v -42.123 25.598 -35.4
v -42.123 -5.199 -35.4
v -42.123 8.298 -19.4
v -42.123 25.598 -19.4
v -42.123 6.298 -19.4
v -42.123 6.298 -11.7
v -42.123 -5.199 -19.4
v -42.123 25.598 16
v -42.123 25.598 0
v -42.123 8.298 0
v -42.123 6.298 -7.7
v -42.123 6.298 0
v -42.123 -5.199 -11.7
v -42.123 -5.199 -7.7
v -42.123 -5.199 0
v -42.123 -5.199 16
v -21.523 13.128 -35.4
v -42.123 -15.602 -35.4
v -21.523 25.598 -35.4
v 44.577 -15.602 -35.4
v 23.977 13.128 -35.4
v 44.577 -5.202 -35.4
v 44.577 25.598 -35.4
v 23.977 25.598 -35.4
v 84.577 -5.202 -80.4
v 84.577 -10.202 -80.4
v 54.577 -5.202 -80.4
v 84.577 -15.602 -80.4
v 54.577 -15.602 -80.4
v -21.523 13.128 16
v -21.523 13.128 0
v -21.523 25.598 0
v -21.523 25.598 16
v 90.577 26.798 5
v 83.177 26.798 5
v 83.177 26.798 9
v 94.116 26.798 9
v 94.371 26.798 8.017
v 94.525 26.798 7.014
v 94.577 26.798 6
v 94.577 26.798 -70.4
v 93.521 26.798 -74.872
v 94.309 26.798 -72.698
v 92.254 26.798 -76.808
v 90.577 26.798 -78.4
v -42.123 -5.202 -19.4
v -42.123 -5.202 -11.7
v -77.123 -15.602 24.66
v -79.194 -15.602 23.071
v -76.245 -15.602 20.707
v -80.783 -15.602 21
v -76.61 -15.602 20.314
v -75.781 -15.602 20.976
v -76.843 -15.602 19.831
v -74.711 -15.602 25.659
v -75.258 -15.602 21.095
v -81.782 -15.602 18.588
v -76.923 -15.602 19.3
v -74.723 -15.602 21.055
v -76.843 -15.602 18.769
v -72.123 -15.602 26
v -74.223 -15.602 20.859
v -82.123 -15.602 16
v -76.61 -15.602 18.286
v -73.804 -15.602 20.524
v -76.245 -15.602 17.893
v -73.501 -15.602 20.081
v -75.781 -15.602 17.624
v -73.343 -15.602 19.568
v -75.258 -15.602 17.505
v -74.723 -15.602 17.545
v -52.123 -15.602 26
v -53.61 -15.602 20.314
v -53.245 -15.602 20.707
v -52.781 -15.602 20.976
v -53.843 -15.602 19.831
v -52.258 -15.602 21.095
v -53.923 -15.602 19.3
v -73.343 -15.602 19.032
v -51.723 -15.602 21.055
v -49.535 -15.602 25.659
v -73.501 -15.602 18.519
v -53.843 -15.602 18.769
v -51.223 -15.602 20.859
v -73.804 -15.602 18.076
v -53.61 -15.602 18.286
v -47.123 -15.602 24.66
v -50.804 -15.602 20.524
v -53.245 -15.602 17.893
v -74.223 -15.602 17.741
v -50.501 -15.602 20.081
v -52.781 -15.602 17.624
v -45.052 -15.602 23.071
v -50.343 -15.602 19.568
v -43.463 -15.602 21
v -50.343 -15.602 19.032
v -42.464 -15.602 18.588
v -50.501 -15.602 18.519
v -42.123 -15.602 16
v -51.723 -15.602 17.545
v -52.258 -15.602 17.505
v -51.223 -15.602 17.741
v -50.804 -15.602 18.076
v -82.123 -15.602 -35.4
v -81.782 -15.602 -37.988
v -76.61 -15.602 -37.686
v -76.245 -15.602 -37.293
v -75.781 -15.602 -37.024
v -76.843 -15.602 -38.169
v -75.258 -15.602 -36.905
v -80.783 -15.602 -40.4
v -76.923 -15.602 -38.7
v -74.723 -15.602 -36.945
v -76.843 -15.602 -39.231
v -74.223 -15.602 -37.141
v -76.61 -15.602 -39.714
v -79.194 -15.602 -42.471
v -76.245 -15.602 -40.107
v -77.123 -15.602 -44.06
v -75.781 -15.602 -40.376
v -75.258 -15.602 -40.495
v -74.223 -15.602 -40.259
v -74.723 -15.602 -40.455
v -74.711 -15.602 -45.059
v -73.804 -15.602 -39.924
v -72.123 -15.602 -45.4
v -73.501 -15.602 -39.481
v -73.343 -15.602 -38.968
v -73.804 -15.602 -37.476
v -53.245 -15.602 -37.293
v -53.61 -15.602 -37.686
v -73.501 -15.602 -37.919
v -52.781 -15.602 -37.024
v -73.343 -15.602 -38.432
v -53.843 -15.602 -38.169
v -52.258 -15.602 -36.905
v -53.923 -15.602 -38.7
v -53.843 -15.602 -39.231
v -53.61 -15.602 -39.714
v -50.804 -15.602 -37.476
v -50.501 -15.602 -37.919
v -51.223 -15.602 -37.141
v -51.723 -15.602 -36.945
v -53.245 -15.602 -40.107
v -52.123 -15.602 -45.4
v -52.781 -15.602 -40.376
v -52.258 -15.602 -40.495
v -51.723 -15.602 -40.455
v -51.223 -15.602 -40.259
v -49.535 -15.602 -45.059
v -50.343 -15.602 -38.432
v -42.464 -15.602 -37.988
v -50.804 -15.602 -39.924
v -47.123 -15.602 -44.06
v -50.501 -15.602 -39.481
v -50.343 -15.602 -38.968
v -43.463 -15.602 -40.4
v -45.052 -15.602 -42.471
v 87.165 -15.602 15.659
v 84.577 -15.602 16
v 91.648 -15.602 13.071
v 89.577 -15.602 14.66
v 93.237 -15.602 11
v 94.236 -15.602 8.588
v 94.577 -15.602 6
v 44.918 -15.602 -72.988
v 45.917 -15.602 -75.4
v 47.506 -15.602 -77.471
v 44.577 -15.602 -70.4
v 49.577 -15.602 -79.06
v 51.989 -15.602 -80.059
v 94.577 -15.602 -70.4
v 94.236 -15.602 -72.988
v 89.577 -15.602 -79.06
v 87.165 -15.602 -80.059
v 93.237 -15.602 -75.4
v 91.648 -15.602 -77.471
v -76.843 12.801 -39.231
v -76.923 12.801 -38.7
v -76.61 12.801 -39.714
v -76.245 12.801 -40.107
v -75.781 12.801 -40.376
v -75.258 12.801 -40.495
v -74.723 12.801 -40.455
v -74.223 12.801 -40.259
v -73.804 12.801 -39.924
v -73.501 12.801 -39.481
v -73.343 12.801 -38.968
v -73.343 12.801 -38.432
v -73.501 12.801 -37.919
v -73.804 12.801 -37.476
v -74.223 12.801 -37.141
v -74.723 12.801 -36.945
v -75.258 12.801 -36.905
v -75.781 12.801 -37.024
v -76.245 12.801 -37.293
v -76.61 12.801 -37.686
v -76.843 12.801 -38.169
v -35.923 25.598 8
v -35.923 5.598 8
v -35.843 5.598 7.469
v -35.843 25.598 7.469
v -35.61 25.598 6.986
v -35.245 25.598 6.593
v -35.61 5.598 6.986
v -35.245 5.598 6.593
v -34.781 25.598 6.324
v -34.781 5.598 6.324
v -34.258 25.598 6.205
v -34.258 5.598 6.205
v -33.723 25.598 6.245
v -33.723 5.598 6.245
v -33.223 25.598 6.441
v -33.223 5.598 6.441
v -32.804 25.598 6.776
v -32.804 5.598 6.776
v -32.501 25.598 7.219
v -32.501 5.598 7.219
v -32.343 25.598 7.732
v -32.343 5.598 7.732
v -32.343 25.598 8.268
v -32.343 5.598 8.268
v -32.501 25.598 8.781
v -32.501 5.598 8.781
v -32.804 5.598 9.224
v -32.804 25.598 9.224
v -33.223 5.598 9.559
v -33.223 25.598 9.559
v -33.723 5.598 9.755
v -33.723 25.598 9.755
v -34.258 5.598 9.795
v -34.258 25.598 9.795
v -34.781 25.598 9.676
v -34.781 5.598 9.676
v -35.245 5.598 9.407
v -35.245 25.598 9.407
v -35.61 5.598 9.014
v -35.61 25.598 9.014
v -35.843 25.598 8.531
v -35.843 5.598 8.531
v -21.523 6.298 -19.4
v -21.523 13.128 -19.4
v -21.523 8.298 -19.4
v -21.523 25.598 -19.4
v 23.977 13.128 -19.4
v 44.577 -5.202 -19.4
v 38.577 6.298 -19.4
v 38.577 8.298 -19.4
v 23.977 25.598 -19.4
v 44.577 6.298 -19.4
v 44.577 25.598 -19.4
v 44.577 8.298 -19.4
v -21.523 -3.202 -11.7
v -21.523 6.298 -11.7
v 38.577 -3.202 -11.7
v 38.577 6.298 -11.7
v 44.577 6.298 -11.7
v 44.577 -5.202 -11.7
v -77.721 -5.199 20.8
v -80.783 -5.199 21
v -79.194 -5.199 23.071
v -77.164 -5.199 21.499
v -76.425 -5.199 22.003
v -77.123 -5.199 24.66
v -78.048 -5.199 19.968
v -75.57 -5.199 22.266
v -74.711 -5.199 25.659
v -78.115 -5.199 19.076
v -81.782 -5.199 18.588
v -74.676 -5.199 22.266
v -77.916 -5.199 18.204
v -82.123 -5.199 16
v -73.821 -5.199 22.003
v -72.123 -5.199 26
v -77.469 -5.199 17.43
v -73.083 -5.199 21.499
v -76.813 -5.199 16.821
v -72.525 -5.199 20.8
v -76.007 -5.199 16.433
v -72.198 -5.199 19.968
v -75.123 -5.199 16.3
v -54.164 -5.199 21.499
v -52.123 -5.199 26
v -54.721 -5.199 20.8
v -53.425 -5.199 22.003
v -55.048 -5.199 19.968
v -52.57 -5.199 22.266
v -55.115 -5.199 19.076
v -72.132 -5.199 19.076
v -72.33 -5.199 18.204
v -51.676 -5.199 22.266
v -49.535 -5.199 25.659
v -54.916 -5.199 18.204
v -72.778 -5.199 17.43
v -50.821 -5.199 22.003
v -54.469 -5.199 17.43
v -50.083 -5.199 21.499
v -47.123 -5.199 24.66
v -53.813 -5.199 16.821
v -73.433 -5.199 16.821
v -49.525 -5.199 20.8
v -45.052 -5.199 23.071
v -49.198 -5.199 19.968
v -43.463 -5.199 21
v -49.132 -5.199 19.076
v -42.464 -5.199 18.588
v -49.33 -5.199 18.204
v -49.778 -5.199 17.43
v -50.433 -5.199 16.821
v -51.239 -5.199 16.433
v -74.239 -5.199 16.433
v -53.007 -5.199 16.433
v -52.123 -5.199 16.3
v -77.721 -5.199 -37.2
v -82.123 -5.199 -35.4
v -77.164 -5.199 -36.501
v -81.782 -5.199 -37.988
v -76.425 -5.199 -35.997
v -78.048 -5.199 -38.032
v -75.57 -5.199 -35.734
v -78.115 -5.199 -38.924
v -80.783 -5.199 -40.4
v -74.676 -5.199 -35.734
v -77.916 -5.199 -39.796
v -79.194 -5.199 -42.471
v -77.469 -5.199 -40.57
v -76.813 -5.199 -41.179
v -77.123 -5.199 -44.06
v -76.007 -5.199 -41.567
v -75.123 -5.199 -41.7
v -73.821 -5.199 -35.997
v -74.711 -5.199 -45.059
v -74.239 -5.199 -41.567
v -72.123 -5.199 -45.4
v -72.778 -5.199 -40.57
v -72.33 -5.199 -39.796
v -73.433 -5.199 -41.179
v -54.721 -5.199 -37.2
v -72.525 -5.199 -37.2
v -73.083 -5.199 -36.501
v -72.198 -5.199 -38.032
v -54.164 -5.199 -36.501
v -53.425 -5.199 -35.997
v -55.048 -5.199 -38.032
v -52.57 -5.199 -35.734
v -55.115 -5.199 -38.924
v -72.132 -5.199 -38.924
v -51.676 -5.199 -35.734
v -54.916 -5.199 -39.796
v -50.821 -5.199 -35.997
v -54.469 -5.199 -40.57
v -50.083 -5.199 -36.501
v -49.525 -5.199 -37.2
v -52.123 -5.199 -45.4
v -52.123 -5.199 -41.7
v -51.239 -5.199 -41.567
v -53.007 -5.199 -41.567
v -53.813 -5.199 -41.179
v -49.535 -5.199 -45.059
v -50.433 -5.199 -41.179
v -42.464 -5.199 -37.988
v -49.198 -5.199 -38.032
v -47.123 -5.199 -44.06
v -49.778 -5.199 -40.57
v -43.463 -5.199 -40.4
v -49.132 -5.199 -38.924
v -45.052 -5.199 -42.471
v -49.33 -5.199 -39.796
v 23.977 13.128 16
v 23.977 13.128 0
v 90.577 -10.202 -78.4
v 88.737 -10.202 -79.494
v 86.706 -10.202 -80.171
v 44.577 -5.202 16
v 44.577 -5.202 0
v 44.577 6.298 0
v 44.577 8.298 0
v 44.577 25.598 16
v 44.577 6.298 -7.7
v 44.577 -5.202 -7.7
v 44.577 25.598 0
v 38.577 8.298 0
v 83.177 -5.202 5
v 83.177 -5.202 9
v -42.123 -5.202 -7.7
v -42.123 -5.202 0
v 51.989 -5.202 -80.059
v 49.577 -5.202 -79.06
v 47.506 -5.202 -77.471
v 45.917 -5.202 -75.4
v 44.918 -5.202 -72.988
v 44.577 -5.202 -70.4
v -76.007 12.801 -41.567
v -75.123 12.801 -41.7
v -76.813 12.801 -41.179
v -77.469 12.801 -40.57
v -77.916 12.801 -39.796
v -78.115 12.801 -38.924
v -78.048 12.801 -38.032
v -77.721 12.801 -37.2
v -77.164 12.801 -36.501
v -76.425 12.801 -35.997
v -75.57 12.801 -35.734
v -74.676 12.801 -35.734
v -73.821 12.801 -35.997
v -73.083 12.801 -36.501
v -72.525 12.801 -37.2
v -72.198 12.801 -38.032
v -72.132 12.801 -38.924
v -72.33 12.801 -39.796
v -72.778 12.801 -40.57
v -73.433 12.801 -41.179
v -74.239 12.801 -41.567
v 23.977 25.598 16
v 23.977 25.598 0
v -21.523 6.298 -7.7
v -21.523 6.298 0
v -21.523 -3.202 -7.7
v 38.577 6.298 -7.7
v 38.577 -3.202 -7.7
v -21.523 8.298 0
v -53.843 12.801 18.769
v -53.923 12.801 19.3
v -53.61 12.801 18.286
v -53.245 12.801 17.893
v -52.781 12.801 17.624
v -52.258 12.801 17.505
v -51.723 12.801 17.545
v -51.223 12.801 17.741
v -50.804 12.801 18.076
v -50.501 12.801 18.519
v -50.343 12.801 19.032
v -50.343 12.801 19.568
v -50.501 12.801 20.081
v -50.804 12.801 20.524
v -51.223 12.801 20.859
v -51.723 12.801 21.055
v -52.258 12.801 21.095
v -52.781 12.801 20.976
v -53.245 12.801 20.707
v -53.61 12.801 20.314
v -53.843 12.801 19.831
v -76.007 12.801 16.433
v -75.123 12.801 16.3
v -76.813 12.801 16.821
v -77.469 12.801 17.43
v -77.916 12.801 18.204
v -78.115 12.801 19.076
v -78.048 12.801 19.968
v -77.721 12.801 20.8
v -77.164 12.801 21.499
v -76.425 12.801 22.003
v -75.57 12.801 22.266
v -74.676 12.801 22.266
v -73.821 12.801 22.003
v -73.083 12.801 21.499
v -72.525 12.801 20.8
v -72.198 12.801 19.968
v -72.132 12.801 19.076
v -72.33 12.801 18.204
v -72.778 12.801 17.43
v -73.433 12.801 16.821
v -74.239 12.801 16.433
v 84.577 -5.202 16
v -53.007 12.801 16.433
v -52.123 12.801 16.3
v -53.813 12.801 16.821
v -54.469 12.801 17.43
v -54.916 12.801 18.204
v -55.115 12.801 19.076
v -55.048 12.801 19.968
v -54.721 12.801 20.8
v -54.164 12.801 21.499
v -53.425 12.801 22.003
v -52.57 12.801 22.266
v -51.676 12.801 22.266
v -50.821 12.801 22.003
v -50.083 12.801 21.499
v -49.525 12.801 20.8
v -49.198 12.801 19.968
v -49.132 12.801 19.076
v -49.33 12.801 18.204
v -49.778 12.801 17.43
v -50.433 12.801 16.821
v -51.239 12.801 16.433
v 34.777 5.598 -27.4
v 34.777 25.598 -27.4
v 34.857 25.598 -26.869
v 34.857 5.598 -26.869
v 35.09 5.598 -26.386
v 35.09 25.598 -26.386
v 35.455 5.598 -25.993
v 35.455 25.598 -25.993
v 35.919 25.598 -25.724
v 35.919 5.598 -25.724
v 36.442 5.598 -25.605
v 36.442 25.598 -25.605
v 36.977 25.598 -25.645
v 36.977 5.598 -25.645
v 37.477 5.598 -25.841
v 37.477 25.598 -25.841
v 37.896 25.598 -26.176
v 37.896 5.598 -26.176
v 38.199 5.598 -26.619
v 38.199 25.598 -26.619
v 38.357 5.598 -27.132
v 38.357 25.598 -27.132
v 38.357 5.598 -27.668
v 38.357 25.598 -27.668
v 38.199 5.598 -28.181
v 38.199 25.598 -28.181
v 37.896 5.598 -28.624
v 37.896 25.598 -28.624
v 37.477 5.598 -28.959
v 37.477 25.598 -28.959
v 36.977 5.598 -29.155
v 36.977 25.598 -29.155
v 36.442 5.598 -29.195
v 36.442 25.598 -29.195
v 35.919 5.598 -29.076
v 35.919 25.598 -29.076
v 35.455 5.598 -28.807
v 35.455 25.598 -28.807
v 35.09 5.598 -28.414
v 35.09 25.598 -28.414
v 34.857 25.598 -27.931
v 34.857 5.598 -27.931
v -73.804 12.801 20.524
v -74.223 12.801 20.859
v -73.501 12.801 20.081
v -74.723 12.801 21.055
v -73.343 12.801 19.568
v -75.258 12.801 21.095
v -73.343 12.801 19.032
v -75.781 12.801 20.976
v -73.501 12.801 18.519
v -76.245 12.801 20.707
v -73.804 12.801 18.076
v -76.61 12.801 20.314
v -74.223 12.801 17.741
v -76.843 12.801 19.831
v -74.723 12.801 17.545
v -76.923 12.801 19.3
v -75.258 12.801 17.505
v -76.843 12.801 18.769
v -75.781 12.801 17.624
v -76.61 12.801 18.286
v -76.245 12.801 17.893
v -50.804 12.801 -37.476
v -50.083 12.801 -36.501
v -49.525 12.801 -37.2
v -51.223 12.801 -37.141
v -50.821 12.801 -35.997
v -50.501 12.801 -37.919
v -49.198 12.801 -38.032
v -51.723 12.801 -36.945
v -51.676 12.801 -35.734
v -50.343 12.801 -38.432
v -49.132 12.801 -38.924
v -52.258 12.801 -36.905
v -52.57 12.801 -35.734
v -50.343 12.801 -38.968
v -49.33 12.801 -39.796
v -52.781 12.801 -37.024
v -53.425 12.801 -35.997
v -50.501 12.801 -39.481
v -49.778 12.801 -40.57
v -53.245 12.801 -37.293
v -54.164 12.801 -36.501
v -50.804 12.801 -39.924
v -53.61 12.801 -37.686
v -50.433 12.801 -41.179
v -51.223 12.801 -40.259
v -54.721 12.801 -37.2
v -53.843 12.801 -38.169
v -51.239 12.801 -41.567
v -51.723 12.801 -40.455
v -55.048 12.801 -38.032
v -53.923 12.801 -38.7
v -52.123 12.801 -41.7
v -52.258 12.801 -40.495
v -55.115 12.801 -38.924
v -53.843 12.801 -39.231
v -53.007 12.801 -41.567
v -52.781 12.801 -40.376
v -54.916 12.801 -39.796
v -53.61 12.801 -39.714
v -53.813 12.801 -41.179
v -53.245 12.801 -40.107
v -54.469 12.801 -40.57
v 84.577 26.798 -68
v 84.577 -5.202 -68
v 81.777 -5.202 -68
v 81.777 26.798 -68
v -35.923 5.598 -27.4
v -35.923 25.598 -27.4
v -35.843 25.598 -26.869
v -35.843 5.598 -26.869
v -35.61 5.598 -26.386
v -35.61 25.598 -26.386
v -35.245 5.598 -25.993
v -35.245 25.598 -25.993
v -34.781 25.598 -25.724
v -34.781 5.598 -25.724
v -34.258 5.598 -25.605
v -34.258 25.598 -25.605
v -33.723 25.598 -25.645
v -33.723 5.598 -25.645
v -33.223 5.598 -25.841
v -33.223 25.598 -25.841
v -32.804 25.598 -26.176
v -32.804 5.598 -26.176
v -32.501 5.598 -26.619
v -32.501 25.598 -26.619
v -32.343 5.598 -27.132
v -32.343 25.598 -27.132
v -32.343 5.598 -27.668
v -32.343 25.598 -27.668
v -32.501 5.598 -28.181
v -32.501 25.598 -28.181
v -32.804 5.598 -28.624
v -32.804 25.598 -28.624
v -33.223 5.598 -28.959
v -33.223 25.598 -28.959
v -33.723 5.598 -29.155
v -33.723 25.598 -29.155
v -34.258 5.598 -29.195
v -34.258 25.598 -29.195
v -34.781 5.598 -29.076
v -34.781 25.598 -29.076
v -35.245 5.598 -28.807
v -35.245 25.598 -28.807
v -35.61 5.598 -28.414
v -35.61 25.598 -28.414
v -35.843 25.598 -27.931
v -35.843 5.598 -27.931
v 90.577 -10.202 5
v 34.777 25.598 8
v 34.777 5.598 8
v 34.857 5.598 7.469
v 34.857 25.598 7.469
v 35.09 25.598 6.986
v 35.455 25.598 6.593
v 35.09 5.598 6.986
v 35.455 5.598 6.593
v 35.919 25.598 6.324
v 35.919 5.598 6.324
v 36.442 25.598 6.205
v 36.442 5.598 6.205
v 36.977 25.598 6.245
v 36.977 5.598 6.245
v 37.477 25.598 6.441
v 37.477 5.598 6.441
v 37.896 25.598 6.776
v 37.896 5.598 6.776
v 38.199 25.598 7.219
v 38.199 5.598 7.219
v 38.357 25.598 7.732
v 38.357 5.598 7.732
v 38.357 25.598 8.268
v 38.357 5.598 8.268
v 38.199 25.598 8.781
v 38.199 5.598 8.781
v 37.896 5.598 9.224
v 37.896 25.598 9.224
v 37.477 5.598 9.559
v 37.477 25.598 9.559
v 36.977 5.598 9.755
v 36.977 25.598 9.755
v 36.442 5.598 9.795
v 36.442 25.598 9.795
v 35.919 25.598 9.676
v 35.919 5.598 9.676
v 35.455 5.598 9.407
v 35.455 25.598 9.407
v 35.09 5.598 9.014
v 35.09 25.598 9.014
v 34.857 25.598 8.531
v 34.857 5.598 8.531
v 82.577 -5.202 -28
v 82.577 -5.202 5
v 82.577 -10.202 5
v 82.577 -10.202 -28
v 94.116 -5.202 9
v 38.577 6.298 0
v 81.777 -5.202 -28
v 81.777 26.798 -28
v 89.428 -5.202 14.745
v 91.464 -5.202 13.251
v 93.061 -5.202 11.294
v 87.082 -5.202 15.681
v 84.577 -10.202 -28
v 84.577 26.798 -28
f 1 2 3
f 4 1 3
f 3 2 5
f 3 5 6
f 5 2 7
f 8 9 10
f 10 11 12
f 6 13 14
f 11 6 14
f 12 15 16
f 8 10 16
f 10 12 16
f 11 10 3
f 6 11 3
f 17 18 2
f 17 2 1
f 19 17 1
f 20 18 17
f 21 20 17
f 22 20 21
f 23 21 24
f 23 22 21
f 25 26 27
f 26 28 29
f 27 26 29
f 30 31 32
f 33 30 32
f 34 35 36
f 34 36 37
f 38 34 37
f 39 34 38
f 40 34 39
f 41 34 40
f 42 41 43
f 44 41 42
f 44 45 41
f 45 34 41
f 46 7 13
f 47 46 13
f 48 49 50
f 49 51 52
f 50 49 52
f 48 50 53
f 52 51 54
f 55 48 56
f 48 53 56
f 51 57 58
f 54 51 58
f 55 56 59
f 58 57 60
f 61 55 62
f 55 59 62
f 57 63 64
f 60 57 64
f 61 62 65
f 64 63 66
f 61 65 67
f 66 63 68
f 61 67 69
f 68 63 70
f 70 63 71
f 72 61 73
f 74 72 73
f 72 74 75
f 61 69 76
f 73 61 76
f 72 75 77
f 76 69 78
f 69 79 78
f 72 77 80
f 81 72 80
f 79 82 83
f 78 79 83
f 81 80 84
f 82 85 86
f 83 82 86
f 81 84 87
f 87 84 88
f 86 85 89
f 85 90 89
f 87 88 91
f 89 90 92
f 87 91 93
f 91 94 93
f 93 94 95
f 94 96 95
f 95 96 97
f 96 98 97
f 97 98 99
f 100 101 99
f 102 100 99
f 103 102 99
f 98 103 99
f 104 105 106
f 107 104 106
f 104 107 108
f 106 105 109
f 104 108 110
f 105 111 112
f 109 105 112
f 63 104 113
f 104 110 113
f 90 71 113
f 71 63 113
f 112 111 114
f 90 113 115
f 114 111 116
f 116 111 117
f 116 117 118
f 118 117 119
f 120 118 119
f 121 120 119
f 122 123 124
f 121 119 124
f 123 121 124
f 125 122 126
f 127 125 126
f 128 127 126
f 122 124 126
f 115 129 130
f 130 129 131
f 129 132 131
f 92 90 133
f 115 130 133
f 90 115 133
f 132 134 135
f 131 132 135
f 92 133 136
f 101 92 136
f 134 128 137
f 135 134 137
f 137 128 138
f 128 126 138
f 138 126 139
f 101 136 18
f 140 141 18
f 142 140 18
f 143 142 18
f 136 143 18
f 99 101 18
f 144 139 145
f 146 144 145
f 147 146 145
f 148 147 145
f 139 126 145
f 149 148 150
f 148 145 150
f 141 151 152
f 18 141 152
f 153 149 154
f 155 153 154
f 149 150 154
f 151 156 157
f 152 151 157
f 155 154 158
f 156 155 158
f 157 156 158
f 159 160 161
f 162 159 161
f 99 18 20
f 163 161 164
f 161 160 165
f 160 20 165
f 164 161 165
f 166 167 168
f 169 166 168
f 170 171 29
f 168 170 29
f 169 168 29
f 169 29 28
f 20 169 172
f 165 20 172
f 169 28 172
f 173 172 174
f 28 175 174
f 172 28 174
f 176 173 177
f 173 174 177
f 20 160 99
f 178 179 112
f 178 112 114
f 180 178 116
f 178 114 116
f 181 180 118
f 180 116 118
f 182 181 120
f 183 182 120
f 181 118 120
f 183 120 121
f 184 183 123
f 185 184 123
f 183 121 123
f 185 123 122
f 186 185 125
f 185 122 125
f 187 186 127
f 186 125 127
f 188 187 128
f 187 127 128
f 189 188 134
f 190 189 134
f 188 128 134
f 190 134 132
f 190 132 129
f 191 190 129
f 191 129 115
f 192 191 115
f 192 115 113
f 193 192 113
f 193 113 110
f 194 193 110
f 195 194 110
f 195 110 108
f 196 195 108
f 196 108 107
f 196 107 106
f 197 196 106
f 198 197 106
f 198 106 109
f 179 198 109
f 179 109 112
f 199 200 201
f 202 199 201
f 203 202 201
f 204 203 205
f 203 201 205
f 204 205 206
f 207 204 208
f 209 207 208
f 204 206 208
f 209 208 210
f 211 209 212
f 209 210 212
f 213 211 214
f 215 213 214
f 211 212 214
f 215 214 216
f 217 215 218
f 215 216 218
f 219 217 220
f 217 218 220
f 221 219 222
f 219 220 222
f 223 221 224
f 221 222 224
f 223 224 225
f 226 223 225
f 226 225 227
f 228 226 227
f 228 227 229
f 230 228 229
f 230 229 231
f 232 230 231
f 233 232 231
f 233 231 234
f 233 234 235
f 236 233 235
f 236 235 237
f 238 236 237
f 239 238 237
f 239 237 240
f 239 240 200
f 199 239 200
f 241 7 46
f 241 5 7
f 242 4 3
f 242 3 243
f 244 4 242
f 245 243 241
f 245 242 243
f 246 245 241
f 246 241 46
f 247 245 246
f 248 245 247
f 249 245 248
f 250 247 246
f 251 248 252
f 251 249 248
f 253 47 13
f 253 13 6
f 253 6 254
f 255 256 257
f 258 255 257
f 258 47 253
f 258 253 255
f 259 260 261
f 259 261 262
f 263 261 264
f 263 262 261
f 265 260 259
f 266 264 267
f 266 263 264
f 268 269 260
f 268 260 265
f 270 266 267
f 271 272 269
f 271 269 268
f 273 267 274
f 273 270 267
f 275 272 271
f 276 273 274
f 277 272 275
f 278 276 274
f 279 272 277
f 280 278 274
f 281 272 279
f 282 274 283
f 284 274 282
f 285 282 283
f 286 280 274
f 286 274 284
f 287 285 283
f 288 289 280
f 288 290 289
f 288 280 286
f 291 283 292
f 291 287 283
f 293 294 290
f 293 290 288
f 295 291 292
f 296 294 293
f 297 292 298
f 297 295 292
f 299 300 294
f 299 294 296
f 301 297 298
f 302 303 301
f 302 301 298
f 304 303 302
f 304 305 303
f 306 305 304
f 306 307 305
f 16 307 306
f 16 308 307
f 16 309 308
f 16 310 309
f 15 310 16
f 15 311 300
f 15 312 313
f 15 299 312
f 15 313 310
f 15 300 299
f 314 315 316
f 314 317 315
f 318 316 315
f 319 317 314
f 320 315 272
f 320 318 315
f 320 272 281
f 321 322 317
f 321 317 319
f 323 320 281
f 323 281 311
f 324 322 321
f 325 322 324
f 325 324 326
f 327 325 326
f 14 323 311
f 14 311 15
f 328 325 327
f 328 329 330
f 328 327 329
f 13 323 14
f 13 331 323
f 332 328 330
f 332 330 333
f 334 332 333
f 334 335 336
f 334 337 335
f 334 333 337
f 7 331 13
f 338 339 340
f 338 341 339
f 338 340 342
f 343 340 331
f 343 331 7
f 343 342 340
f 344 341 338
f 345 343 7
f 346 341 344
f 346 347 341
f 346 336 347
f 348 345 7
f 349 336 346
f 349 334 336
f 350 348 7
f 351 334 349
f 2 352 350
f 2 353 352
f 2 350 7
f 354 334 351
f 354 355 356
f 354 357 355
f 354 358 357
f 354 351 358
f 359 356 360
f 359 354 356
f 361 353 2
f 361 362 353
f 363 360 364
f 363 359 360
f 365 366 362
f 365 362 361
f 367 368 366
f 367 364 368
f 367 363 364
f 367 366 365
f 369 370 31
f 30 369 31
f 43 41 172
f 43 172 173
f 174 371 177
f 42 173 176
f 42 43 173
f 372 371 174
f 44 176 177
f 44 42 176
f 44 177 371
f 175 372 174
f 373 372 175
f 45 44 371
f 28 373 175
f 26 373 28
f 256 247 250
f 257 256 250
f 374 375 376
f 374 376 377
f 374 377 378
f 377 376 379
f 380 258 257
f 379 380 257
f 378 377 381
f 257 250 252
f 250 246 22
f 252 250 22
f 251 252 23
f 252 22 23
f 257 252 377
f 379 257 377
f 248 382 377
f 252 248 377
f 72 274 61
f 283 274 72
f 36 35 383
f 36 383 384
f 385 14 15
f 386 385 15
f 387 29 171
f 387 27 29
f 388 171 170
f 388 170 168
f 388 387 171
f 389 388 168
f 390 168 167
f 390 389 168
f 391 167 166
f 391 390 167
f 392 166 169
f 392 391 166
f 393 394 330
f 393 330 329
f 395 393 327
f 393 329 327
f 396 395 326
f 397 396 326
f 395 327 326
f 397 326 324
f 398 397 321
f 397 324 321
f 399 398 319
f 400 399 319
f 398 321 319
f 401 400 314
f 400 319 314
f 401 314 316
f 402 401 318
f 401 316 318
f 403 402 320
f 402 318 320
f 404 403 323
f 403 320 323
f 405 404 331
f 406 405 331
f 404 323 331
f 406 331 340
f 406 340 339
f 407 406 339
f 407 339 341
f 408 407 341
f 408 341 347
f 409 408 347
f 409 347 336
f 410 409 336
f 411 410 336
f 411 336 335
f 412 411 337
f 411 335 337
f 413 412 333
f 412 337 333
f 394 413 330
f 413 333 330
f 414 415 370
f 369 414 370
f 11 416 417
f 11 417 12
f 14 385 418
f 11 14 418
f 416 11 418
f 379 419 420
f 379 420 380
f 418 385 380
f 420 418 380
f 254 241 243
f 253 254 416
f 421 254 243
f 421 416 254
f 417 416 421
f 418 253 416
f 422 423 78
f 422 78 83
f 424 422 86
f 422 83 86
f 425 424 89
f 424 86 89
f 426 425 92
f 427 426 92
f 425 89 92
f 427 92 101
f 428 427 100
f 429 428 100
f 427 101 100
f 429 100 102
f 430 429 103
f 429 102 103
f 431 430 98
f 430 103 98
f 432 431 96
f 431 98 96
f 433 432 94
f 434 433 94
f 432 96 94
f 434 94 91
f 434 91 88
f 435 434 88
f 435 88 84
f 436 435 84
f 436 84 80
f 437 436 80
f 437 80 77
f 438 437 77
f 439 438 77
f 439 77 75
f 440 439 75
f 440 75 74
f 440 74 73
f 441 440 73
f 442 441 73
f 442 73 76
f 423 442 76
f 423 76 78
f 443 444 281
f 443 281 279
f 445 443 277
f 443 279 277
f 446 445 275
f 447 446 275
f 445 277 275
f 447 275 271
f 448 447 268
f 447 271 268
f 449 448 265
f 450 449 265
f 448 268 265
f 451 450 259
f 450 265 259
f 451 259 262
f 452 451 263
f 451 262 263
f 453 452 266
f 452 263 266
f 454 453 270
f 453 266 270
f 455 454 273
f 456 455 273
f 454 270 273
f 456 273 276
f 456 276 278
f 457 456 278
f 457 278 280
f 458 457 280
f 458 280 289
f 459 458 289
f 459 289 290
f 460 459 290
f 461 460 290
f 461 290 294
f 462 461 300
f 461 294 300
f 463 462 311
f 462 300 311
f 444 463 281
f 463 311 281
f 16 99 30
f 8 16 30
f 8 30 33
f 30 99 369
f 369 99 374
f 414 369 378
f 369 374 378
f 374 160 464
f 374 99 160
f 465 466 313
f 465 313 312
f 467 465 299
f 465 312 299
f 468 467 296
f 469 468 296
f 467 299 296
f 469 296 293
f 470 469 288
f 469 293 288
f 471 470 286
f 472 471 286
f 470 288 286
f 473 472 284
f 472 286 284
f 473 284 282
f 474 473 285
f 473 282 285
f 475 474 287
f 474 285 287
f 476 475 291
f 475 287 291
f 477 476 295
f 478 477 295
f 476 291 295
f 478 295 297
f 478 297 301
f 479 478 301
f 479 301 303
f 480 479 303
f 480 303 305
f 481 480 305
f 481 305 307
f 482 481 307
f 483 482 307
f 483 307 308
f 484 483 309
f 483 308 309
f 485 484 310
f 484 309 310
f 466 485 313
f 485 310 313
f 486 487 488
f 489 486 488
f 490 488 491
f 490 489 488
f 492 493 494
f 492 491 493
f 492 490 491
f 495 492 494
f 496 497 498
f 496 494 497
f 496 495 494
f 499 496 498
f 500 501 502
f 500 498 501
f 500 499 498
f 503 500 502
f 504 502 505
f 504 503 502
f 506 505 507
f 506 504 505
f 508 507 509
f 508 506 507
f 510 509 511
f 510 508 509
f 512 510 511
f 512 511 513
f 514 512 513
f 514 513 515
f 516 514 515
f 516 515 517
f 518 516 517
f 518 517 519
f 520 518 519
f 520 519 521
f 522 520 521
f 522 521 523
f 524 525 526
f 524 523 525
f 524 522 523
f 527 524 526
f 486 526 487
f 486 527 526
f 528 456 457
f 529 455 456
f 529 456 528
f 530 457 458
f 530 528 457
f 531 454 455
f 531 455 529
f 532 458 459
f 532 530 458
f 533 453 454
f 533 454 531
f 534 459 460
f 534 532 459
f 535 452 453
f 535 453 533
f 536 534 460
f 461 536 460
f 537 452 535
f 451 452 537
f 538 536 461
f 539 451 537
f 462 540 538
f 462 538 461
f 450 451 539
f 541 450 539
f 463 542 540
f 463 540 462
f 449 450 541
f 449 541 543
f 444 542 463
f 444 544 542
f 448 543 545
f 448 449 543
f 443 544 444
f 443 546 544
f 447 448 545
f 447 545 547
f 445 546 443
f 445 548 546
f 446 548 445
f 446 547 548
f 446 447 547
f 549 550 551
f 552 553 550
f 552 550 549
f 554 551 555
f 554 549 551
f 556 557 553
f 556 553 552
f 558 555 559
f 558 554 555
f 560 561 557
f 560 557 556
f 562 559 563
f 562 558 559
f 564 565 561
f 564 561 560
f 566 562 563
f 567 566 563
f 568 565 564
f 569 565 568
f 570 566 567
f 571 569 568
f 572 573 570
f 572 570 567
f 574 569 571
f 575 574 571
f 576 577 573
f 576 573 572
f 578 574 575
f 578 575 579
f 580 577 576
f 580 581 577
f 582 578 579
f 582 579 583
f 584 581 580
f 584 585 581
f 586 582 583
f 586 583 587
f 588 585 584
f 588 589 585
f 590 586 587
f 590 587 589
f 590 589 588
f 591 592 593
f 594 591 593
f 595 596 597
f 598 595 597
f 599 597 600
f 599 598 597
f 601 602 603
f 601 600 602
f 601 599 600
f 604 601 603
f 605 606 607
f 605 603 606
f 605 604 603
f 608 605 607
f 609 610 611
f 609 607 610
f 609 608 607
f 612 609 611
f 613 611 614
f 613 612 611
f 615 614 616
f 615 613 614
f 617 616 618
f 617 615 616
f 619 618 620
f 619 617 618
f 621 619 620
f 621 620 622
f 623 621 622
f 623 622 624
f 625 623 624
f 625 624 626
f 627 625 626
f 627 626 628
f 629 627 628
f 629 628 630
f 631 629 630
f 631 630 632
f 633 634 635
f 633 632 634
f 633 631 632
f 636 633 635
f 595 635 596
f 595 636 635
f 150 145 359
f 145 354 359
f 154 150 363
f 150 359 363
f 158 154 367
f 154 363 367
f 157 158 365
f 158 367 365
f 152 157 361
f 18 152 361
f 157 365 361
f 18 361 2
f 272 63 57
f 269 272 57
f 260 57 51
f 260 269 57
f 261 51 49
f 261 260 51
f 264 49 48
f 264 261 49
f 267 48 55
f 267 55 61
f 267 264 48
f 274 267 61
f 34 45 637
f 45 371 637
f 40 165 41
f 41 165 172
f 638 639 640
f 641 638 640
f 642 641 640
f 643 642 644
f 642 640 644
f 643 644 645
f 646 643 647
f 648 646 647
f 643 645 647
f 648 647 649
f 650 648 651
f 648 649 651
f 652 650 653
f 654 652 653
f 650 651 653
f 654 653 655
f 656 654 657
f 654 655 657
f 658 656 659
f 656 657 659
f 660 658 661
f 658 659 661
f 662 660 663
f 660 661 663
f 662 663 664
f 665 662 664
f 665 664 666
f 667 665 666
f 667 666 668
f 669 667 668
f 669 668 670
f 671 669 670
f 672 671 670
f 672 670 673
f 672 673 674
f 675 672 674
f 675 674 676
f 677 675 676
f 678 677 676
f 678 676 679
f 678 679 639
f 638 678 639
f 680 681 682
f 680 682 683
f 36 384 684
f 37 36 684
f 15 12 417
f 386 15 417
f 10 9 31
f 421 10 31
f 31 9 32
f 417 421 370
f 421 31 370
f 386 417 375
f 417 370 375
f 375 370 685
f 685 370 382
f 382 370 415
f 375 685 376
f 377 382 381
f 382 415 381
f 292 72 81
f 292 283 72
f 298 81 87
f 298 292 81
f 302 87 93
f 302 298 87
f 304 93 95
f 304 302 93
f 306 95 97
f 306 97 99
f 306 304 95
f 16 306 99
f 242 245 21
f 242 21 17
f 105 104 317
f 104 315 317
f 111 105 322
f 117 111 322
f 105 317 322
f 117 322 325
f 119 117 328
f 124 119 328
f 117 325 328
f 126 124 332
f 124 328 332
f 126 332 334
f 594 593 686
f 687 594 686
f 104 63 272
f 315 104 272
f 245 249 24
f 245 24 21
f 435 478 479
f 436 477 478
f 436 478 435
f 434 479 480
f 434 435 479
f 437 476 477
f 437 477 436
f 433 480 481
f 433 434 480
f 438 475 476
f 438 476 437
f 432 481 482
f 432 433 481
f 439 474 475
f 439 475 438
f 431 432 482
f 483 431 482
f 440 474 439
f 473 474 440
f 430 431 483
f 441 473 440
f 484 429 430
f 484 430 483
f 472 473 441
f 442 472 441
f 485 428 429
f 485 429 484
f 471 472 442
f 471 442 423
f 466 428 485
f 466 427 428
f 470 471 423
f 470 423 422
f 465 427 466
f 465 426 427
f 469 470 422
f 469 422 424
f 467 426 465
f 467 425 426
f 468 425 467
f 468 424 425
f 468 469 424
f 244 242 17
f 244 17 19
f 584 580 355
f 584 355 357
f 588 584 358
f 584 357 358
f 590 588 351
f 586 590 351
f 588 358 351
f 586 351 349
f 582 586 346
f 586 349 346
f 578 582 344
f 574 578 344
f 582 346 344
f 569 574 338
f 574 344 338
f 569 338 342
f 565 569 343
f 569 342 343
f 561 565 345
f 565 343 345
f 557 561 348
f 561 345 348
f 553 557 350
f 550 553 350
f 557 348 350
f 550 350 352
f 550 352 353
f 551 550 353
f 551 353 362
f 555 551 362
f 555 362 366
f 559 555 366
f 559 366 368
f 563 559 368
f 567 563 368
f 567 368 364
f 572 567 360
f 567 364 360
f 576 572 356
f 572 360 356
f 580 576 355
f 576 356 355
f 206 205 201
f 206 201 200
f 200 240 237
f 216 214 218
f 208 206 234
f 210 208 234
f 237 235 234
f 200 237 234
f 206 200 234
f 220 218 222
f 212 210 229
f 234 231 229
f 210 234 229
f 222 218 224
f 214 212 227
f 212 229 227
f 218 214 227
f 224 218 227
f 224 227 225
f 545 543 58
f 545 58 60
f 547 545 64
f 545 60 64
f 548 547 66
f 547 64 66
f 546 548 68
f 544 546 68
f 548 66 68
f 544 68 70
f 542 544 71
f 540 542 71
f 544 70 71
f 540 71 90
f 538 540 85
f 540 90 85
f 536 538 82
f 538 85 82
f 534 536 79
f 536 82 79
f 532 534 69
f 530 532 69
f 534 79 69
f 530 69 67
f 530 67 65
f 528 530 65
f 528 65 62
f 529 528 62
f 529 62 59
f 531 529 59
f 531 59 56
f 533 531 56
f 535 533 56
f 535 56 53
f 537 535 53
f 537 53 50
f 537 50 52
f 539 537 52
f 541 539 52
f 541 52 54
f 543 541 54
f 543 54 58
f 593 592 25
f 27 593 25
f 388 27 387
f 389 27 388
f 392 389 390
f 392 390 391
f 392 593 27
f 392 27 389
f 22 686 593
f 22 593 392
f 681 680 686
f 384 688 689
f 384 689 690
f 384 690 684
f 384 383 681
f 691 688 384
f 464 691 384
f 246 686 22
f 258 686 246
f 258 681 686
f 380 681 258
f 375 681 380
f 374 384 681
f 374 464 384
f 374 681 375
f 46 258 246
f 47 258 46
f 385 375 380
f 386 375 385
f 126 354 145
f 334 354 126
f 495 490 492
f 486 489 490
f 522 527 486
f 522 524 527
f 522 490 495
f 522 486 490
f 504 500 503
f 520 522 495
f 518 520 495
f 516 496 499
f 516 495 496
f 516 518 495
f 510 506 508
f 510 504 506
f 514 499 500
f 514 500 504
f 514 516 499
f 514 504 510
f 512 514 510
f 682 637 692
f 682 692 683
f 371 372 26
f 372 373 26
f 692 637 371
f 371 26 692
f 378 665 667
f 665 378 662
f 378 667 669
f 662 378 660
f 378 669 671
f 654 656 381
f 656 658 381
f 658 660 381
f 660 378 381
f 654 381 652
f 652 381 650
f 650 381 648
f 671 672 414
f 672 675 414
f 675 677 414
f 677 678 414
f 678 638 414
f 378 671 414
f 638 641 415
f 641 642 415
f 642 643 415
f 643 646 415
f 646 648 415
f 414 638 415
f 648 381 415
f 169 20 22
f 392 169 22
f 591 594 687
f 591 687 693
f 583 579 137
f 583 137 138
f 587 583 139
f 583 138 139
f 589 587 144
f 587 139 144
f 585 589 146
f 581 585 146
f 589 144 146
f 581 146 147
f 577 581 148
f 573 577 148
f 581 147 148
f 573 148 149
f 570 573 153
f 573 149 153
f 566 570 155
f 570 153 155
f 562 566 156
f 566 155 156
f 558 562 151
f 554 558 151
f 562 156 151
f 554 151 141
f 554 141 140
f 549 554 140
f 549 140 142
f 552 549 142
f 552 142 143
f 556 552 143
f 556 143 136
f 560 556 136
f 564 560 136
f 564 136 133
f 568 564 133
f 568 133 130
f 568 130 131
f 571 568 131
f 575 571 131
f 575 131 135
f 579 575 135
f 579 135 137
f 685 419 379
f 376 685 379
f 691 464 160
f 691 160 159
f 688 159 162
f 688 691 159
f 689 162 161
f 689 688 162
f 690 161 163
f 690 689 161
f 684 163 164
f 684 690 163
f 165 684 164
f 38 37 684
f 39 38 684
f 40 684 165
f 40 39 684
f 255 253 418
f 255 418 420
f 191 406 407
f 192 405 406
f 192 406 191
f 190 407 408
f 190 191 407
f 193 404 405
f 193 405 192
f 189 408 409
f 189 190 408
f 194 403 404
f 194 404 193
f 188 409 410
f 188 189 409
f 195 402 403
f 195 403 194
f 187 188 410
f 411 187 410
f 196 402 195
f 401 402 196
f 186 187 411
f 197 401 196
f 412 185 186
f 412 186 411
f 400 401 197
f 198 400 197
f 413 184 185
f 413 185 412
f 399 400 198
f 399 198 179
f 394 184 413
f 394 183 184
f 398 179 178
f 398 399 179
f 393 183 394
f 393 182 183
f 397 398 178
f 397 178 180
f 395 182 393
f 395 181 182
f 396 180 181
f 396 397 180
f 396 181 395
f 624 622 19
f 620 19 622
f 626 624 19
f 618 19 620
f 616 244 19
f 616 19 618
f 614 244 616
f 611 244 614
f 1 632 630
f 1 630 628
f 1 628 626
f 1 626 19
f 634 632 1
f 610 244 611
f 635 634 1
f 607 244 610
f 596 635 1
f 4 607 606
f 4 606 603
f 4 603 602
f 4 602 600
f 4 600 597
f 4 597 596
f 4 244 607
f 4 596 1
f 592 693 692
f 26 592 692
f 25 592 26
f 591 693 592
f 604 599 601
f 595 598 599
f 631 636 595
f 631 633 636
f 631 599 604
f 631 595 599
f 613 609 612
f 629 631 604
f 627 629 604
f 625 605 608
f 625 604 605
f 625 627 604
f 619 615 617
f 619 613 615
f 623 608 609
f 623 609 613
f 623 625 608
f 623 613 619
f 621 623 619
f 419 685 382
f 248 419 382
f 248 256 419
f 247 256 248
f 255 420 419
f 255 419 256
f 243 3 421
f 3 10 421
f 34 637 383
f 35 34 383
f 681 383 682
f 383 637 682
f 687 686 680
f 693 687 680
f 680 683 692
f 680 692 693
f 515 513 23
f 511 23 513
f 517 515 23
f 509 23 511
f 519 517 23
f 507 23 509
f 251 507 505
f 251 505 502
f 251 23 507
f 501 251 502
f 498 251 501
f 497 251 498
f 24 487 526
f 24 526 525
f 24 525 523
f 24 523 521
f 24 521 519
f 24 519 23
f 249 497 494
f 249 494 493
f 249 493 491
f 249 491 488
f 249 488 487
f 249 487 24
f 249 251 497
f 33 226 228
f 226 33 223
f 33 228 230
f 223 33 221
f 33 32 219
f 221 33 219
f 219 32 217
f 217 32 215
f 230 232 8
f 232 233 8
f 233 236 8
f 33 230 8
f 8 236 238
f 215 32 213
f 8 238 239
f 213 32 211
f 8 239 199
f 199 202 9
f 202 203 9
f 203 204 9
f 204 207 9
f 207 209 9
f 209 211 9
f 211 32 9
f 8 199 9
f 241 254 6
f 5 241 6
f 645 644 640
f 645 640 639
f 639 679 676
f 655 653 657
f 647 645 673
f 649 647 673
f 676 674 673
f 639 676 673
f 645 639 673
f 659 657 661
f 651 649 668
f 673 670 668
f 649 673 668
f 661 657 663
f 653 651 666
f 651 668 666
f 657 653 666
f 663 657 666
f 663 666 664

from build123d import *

# Parameters (mm, degrees)
EXTRUDE_1_DEPTH     = 16
F_1_0MM_1_D         = 3.6
F_1_0MM_2_D         = 3.6
SKETCH_8_W          = 86.7
SKETCH_8_H          = 16
EXTRUDE_2_DEPTH     = 21.2
SKETCH_9_W          = 86.7
SKETCH_9_H          = 10.4
EXTRUDE_3_DEPTH     = 9.7
SKETCH_15_W         = 20.6
SKETCH_15_H         = 2
EXTRUDE_8_DEPTH     = 13.5
SKETCH_16_W         = 20.6
SKETCH_16_H         = 2
EXTRUDE_9_DEPTH     = 10.5
SKETCH_19_W         = 51.4
SKETCH_19_H         = 10.4
EXTRUDE_10_DEPTH    = 50
SKETCH_25_W         = 50
SKETCH_25_H         = 10.4
EXTRUDE_11_DEPTH    = 45
EXTRUDE_12_DEPTH    = 32
CUT_EXTRUDE_1_DEPTH = 5
SKETCH_29_W         = 51.4
SKETCH_29_H         = 10.402970243
EXTRUDE_13_DEPTH    = 40
SKETCH_32_W         = 40
SKETCH_32_H         = 10.402970243
EXTRUDE_14_DEPTH    = 10
SKETCH_33_W         = 40
SKETCH_33_H         = 10.402970243
EXTRUDE_15_DEPTH    = 10
SKETCH_34_R         = 3
EXTRUDE_16_DEPTH    = 18
F_1_0MM_3_D         = 3.6
F_1_0MM_4_D         = 3.6
FILLET_1_R          = 10
FILLET_2_R          = 10
SKETCH_40_W         = 6
SKETCH_40_H         = 4
EXTRUDE_17_DEPTH    = 11.5
SKETCH_42_W         = 6
SKETCH_42_H         = 19.4
EXTRUDE_18_DEPTH    = 2
SKETCH_46_W         = 60.1
SKETCH_46_H         = 4
EXTRUDE_19_DEPTH    = 2


with BuildPart() as part:
    # 草图1 → 凸台-拉伸1 (new body)
    with BuildSketch(Plane.XY):
        Polygon((-21.523113208, 25.59839861), (-42.123113208, 25.59839861), (-42.123113208, 5.59839861), (44.576886792, 5.59839861), (44.576886792, 25.59839861), (23.976886792, 25.59839861), (23.976886792, 13.12839861), (-21.523113208, 13.12839861), align=None)
    extrude_1 = extrude(amount=EXTRUDE_1_DEPTH)

    # Ø1.0mm 暗销孔1 (through all)
    with Locations(Plane(origin=(0, 25.59839861, 0), x_dir=(1, 0, 0), z_dir=(0, 1, 0))):
        with Locations((36.576886792, -8)):
            f_1_0mm_1 = Hole(F_1_0MM_1_D / 2)

    # Ø1.0mm 暗销孔2 (through all)
    with Locations(Plane(origin=(0, 25.59839861, 0), x_dir=(1, 0, 0), z_dir=(0, 1, 0))):
        with Locations((-34.123113208, -8)):
            f_1_0mm_2 = Hole(F_1_0MM_2_D / 2)

    # 草图8 → 凸台-拉伸2 (add)
    with BuildSketch(Plane.XZ.offset(-5.59839861)):
        with Locations((1.226886792, 8)):
            Rectangle(SKETCH_8_W, SKETCH_8_H)
    extrude_2 = extrude(amount=EXTRUDE_2_DEPTH)

    # 草图9 → 凸台-拉伸3 (add)
    with BuildSketch(Plane(origin=(0, 0, 0), x_dir=(-1, 0, 0), z_dir=(0, 0, -1))):
        with Locations((-1.226886792, -10.40160139)):
            Rectangle(SKETCH_9_W, SKETCH_9_H)
    extrude_3 = extrude(amount=EXTRUDE_3_DEPTH)

    # 草图15 → 凸台-拉伸8 (add)
    with BuildSketch(Plane(origin=(0, -5.20160139, 0), x_dir=(1, 0, 0), z_dir=(0, 1, 0))):
        with Locations((-31.823113208, 8.7)):
            Rectangle(SKETCH_15_W, SKETCH_15_H)
    extrude_8 = extrude(amount=EXTRUDE_8_DEPTH)

    # 草图16 → 凸台-拉伸9 (add)
    with BuildSketch(Plane(origin=(0, 0, -9.7), x_dir=(-1, 0, 0), z_dir=(0, 0, -1))):
        with Locations((31.823113208, 7.29839861)):
            Rectangle(SKETCH_16_W, SKETCH_16_H)
    extrude_9 = extrude(amount=-EXTRUDE_9_DEPTH)

    # 镜向20: 凸台-拉伸1, Ø1.0mm 暗销孔1, Ø1.0mm 暗销孔2, 凸台-拉伸2, 凸台-拉伸3, 凸台-拉伸8, 凸台-拉伸9 across plane
    add(extrude_1.mirror(Plane.XY.offset(-9.7)))
    add(f_1_0mm_1.mirror(Plane.XY.offset(-9.7)), mode=Mode.SUBTRACT)
    add(f_1_0mm_2.mirror(Plane.XY.offset(-9.7)), mode=Mode.SUBTRACT)
    add(extrude_2.mirror(Plane.XY.offset(-9.7)))
    add(extrude_3.mirror(Plane.XY.offset(-9.7)))
    add(extrude_8.mirror(Plane.XY.offset(-9.7)))
    add(extrude_9.mirror(Plane.XY.offset(-9.7)))

    # 草图19 → 凸台-拉伸10 (add)
    with BuildSketch(Plane(origin=(44.576886792, 0, 0), x_dir=(0, 0, -1), z_dir=(1, 0, 0))):
        with Locations((9.7, -10.40160139)):
            Rectangle(SKETCH_19_W, SKETCH_19_H)
    extrude(amount=EXTRUDE_10_DEPTH)

    # 草图25 → 凸台-拉伸11 (add)
    with BuildSketch(Plane(origin=(0, 0, -35.4), x_dir=(-1, 0, 0), z_dir=(0, 0, -1))):
        with Locations((-69.576886792, -10.40160139)):
            Rectangle(SKETCH_25_W, SKETCH_25_H)
    extrude(amount=EXTRUDE_11_DEPTH)

    # 草图26 → 凸台-拉伸12 (add)
    with BuildSketch(Plane(origin=(0, -5.20160139, 0), x_dir=(1, 0, 0), z_dir=(0, 1, 0))):
        Polygon((83.176886792, -9), (94.576886792, -9), (94.576886792, -5), (94.576886792, 80.4), (90.576886792, 80.4), (90.576886792, -5), (83.176886792, -5), align=None)
        Polygon((83.176886792, 28), (84.576886792, 28), (84.576886792, 68), (83.176886792, 68), (81.776886792, 68), (81.776886792, 28), align=None)
    extrude(amount=EXTRUDE_12_DEPTH)

    # 草图28 → 切除-拉伸1 (cut)
    with BuildSketch(Plane(origin=(0, -5.20160139, 0), x_dir=(1, 0, 0), z_dir=(0, 1, 0))):
        Polygon((90.576886792, -5), (84.576886792, -5), (82.576886792, -5), (82.576886792, 28), (84.576886792, 28), (84.576886792, 80.4), (90.576886792, 80.4), align=None)
    extrude(amount=-CUT_EXTRUDE_1_DEPTH, mode=Mode.SUBTRACT)

    # 草图29 → 凸台-拉伸13 (add)
    with BuildSketch(Plane.ZY.offset(42.123113208)):
        with Locations((-9.7, -10.400116268)):
            Rectangle(SKETCH_29_W, SKETCH_29_H)
    extrude(amount=EXTRUDE_13_DEPTH)

    # 草图32 → 凸台-拉伸14 (add)
    with BuildSketch(Plane(origin=(0, 0, -35.4), x_dir=(-1, 0, 0), z_dir=(0, 0, -1))):
        with Locations((62.123113208, -10.400116268)):
            Rectangle(SKETCH_32_W, SKETCH_32_H)
    extrude(amount=EXTRUDE_14_DEPTH)

    # 草图33 → 凸台-拉伸15 (add)
    with BuildSketch(Plane.XY.offset(16)):
        with Locations((-62.123113208, -10.400116268)):
            Rectangle(SKETCH_33_W, SKETCH_33_H)
    extrude(amount=EXTRUDE_15_DEPTH)

    # 草图34 → 凸台-拉伸16 (add)
    with BuildSketch(Plane(origin=(0, -5.198631147, 0), x_dir=(1, 0, 0), z_dir=(0, 1, 0))):
        with Locations(Location((-52.123113208, 38.7, 0), (0, 0, 90))):
            Circle(SKETCH_34_R)
        with Locations(Location((-75.123113208, 38.7, 0), (0, 0, 90))):
            Circle(SKETCH_34_R)
        with Locations(Location((-52.123113208, -19.3, 0), (0, 0, 90))):
            Circle(SKETCH_34_R)
        with Locations(Location((-75.123113208, -19.3, 0), (0, 0, 90))):
            Circle(SKETCH_34_R)
    extrude(amount=EXTRUDE_16_DEPTH)

    # Ø1.0mm 暗销孔3 (through all)
    with Locations(Plane(origin=(0, 12.801368853, 0), x_dir=(1, 0, 0), z_dir=(0, 1, 0))):
        with Locations((-52.123113208, 38.7)):
            Hole(F_1_0MM_3_D / 2)

    # Ø1.0mm 暗销孔4 (through all)
    with Locations(Plane(origin=(0, 12.801368853, 0), x_dir=(1, 0, 0), z_dir=(0, 1, 0))):
        with Locations((-52.123113208, -19.3), (-75.123113208, 38.7), (-75.123113208, -19.3)):
            Hole(F_1_0MM_4_D / 2)

    # 圆角1
    fillet_1_edges = [part.edges().sort_by_distance(p)[0] for p in [
        (44.576886792, -10.40160139, -80.4),
        (94.576886792, -10.40160139, 16),
        (-42.123113208, -10.400116268, -45.4),
        (-42.123113208, -10.400116268, 26),
        (-82.123113208, -10.400116268, -45.4),
        (-82.123113208, -10.400116268, 26),
    ]]
    fillet(fillet_1_edges, radius=FILLET_1_R - 0.0001)  # a hair under: the kernel refuses the full size

    # 圆角2
    fillet_2_edges = [part.edges().sort_by_distance(p)[0] for p in [
        (94.576886792, 5.59839861, -80.4),
    ]]
    fillet(fillet_2_edges, radius=FILLET_2_R - 0.0001)  # a hair under: the kernel refuses the full size

    # 草图40 → 凸台-拉伸17 (add)
    with BuildSketch(Plane(origin=(0, -5.20160139, 0), x_dir=(1, 0, 0), z_dir=(0, 1, 0))):
        with Locations((41.576886792, 9.7)):
            Rectangle(SKETCH_40_W, SKETCH_40_H)
    extrude(amount=EXTRUDE_17_DEPTH)

    # 草图42 → 凸台-拉伸18 (add)
    with BuildSketch(Plane(origin=(0, 6.29839861, 0), x_dir=(1, 0, 0), z_dir=(0, 1, 0))):
        with Locations((41.576886792, 9.7)):
            Rectangle(SKETCH_42_W, SKETCH_42_H)
    extrude(amount=EXTRUDE_18_DEPTH)

    # 草图46 → 凸台-拉伸19 (add)
    with BuildSketch(Plane(origin=(0, -5.20160139, 0), x_dir=(1, 0, 0), z_dir=(0, 1, 0))):
        with Locations((8.526886792, 9.7)):
            Rectangle(SKETCH_46_W, SKETCH_46_H)
    extrude(amount=EXTRUDE_19_DEPTH)


solid = part.part
